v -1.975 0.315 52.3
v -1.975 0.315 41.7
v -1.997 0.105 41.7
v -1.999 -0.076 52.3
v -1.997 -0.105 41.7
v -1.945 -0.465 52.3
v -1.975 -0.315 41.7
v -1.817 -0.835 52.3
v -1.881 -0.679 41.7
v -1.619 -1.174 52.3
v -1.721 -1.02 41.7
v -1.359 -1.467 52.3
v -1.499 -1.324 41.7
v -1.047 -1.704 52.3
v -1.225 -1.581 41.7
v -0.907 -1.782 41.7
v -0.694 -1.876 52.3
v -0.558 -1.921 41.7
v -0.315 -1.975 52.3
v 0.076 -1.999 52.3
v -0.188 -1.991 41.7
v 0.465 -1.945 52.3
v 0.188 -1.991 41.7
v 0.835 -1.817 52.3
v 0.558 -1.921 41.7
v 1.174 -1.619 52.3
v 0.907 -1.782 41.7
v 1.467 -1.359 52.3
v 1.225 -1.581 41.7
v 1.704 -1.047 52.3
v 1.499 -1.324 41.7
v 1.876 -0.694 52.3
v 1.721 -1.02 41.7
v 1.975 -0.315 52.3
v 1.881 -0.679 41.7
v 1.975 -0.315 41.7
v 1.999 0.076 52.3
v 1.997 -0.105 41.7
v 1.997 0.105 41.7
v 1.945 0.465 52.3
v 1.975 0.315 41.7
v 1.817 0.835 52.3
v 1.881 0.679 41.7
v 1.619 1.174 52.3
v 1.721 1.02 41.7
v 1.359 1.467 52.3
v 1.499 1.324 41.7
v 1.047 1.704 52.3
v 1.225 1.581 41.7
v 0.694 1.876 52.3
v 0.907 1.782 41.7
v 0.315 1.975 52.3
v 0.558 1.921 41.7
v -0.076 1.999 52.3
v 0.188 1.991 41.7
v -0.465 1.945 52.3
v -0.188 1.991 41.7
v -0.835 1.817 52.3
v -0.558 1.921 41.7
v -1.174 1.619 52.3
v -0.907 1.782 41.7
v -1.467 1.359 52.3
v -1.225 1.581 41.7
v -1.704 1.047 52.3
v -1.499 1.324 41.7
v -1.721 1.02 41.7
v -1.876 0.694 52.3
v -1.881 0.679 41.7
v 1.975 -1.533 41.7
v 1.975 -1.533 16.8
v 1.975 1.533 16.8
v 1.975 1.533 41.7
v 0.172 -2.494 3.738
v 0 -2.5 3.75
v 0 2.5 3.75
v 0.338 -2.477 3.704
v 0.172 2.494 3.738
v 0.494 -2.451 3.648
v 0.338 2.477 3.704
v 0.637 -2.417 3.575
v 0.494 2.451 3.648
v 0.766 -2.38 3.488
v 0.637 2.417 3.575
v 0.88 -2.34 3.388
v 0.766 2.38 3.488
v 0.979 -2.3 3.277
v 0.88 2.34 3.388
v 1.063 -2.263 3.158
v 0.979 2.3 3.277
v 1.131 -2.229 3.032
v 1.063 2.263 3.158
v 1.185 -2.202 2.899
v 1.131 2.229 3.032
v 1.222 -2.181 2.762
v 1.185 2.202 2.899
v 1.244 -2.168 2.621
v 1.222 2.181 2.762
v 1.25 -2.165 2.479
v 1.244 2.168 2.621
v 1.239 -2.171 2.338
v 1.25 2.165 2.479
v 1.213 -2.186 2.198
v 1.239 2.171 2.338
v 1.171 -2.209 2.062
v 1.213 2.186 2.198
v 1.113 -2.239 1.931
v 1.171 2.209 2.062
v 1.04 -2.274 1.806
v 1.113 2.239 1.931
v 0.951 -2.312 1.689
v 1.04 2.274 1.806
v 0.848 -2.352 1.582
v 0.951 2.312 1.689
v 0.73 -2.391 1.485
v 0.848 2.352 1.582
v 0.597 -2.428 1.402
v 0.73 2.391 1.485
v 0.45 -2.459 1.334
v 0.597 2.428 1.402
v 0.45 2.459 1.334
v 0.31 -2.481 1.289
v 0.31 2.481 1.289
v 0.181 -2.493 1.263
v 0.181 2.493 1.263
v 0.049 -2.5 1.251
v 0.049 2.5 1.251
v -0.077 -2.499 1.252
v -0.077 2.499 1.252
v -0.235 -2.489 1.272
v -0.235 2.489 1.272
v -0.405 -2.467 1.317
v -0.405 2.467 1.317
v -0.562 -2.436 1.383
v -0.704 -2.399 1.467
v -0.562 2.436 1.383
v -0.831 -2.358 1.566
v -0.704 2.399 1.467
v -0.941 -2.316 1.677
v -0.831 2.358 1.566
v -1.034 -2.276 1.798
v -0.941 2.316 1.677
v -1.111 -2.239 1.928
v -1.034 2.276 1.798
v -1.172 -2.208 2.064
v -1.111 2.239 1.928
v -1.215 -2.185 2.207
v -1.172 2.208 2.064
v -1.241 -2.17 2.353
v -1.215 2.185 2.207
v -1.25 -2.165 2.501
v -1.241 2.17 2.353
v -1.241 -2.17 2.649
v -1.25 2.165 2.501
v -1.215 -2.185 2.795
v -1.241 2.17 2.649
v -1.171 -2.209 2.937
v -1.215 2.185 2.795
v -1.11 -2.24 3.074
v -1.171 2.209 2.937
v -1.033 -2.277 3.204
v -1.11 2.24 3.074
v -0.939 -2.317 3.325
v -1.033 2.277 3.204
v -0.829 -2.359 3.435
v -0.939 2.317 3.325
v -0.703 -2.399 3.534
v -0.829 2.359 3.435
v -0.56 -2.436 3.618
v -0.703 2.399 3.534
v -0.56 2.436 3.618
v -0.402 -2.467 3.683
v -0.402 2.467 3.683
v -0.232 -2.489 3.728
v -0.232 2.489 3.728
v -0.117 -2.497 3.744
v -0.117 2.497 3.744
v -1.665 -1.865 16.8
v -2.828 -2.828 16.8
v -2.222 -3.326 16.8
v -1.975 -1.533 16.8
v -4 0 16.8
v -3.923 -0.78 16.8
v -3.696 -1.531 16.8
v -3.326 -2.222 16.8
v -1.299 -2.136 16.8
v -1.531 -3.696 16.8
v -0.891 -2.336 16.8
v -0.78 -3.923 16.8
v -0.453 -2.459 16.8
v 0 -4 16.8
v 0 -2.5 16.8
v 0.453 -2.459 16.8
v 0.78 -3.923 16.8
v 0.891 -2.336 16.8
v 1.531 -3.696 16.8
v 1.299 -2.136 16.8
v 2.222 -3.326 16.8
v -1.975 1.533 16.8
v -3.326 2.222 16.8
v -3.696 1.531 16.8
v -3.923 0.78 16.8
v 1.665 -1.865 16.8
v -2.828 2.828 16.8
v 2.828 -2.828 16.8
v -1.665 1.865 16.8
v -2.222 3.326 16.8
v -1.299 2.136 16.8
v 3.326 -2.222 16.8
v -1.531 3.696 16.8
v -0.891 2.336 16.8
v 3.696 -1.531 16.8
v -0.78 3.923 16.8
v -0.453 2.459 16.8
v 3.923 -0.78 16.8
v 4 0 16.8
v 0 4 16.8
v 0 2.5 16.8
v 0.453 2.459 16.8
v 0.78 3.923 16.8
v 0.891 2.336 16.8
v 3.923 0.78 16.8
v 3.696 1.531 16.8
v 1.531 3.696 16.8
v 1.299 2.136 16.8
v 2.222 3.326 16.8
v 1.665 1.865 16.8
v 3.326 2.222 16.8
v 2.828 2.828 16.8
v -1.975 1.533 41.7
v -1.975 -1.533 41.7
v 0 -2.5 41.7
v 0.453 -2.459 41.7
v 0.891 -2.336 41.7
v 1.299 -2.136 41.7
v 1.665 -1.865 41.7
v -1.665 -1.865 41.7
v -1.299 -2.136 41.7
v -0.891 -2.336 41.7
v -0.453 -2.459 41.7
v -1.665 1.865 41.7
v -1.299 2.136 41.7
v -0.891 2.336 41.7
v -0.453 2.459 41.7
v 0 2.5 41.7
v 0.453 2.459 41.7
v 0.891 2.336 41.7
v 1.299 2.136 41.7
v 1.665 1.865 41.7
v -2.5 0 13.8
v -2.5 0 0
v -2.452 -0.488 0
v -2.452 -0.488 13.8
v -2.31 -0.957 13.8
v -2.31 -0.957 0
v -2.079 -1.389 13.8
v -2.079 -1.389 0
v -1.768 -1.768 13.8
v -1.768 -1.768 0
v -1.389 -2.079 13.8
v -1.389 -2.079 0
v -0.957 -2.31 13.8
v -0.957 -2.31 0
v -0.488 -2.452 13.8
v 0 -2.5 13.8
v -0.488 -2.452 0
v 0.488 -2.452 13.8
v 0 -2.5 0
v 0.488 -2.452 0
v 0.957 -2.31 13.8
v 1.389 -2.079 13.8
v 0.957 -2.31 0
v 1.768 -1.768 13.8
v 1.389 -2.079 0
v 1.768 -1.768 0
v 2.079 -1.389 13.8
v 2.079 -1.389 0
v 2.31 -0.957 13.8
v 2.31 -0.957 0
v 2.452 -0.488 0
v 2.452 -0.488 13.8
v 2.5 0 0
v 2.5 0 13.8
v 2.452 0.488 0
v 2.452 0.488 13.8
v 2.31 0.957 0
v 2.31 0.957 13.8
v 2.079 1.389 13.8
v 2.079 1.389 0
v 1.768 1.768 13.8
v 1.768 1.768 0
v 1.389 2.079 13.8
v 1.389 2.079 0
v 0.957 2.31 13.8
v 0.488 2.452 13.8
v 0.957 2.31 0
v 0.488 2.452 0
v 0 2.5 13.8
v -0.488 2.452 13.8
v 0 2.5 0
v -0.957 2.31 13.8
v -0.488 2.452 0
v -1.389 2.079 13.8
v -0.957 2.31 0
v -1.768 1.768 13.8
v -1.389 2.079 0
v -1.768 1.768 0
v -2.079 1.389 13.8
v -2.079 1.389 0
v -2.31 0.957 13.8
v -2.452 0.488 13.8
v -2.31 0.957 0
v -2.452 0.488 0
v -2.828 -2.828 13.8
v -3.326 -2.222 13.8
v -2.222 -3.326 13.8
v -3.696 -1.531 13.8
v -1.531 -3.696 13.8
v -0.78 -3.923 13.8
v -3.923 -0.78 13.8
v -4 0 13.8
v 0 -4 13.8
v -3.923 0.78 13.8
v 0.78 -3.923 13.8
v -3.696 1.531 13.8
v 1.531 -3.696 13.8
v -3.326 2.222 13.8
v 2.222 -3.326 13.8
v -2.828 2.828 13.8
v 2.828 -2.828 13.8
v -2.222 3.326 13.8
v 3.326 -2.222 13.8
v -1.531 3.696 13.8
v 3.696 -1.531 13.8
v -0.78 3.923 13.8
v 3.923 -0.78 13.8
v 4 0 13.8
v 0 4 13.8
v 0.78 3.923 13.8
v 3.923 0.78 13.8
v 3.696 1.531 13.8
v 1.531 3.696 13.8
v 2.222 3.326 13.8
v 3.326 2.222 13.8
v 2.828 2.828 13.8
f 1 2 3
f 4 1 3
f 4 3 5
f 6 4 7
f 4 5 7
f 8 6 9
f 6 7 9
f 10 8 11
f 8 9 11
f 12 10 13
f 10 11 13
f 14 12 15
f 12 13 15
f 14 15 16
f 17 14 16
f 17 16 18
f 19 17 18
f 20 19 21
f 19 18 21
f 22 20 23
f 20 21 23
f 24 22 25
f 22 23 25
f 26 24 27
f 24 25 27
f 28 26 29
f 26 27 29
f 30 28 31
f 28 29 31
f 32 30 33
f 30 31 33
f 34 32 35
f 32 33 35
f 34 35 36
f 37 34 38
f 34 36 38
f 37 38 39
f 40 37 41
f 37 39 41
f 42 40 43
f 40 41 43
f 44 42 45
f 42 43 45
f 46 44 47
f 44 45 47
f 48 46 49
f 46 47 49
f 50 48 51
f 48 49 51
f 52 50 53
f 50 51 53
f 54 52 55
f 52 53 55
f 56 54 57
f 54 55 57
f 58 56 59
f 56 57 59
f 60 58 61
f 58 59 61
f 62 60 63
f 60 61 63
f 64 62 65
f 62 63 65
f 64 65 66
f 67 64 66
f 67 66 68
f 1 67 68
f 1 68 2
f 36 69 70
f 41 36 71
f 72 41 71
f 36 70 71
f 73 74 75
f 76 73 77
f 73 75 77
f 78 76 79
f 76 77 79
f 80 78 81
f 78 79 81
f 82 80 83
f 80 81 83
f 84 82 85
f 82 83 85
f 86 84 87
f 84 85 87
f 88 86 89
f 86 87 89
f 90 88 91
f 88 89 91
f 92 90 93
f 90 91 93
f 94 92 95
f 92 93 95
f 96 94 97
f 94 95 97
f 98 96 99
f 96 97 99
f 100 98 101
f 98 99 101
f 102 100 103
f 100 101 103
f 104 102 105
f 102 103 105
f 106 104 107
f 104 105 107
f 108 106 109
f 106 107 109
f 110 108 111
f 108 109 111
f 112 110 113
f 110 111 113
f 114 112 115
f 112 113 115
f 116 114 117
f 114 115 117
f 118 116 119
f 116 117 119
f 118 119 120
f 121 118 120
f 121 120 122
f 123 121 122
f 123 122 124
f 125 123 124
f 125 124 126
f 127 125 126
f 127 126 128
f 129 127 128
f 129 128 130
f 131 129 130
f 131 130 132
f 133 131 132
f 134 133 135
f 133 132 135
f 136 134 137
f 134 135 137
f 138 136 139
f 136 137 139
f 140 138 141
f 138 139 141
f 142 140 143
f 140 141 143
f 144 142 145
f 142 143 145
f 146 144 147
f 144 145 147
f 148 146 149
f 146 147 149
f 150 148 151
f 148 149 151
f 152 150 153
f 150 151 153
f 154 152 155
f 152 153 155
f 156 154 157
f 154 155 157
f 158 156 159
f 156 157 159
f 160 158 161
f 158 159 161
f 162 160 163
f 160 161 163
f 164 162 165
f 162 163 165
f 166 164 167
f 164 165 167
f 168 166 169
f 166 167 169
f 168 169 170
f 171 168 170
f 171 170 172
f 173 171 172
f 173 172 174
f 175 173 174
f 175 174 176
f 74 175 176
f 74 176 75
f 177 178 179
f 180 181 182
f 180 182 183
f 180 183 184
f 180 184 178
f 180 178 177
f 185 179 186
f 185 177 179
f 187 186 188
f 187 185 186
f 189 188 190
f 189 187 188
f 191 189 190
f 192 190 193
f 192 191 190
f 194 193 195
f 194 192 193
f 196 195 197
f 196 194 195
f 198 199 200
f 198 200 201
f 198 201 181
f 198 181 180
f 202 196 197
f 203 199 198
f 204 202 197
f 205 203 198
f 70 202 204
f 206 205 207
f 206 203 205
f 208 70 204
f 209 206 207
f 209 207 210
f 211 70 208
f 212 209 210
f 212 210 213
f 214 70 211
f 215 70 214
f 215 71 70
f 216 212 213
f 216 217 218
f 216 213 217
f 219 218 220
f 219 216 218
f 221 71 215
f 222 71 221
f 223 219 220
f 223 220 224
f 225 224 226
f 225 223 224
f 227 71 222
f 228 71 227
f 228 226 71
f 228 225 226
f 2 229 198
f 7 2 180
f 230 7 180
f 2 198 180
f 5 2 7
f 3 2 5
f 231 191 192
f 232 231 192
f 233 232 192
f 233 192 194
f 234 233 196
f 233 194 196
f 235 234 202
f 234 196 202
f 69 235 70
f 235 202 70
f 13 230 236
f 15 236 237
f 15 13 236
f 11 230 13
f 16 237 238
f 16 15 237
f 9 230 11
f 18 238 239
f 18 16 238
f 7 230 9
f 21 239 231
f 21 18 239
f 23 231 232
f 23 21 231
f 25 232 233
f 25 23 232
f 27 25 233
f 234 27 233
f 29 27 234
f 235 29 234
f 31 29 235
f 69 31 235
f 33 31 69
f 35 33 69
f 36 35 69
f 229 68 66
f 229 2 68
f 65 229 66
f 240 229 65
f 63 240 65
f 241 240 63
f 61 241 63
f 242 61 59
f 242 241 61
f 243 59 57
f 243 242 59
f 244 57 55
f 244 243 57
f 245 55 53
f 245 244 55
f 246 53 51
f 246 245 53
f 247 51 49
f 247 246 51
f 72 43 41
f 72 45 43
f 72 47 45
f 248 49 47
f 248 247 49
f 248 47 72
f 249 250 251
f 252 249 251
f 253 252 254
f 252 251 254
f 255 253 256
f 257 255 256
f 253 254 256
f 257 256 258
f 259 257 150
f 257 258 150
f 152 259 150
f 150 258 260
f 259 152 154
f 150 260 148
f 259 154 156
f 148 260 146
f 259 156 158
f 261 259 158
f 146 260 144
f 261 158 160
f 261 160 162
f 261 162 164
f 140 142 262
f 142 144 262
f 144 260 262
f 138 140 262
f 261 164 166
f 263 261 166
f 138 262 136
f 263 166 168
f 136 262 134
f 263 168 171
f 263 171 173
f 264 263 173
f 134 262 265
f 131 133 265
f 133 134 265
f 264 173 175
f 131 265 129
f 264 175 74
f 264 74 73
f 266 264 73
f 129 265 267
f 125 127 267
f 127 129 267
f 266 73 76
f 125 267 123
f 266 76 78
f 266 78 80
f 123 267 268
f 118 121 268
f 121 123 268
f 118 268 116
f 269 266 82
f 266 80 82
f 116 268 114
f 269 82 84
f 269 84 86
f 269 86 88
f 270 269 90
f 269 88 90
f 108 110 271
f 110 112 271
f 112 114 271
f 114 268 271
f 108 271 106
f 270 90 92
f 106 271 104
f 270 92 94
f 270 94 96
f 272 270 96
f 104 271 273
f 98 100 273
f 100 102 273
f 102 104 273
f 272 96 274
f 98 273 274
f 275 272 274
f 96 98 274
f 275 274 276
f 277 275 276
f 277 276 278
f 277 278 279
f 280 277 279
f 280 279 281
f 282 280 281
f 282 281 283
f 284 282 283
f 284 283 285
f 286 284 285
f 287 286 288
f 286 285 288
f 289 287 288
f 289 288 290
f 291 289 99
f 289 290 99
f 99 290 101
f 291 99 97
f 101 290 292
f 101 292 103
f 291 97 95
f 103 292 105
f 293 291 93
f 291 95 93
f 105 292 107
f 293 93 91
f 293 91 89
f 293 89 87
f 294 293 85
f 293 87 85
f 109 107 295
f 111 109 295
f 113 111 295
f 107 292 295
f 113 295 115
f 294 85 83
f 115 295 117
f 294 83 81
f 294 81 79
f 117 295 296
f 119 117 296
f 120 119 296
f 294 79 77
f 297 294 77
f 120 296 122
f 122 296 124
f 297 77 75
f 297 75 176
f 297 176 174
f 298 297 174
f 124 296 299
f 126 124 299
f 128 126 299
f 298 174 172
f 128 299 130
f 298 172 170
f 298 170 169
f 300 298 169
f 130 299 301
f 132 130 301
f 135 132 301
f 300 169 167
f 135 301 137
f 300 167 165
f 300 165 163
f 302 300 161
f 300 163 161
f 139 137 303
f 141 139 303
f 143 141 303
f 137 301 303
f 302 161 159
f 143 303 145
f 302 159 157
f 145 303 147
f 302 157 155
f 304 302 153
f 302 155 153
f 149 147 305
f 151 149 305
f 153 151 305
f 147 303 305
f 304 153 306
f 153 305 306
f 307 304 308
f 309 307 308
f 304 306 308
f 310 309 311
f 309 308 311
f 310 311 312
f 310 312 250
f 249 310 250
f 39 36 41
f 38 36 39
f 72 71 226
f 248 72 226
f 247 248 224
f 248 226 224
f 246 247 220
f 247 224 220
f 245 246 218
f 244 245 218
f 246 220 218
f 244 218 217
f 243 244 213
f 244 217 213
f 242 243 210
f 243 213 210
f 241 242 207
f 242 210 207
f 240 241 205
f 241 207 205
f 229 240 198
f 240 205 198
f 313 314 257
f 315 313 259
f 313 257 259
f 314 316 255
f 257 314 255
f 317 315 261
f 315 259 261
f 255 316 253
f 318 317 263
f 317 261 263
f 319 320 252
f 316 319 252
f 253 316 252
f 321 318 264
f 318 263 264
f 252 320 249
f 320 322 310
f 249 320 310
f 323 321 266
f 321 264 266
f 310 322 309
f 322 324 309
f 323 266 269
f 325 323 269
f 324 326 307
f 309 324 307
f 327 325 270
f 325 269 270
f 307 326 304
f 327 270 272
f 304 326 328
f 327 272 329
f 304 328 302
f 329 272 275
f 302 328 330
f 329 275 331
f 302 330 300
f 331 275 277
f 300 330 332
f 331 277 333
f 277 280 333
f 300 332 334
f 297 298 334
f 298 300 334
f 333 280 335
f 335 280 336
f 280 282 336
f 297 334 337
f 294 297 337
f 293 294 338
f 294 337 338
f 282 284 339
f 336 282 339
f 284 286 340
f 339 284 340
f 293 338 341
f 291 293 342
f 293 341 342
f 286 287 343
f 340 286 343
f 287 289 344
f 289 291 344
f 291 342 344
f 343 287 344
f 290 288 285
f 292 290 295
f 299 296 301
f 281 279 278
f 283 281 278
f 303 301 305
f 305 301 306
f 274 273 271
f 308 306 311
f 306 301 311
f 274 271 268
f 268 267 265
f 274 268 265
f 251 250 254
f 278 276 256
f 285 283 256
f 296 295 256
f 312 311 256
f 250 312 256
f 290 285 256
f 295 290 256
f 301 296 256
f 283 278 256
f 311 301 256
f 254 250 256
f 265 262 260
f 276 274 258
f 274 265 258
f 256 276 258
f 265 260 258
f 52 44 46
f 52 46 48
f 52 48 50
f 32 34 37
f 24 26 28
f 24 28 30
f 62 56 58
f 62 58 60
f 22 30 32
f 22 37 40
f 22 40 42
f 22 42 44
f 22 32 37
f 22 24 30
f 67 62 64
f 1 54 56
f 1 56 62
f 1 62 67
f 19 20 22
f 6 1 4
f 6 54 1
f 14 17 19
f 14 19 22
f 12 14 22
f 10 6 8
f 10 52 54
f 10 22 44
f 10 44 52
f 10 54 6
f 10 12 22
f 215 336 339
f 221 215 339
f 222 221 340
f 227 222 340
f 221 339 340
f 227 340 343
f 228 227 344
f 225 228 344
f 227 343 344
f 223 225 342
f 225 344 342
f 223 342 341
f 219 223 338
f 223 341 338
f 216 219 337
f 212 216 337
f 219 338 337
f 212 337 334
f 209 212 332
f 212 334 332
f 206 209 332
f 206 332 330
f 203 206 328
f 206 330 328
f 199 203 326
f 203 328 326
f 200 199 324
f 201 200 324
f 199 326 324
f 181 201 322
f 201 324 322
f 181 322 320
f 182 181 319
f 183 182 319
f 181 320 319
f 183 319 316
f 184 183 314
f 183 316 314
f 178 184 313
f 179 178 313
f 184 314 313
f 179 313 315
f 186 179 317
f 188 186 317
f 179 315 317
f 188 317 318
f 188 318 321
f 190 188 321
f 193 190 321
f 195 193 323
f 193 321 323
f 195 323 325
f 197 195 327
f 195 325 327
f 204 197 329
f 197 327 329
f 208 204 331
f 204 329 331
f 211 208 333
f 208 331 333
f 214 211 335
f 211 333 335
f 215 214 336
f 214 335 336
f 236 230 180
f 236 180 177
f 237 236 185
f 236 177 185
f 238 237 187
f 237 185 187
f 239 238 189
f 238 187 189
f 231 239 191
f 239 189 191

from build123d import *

# Parameters (mm, degrees)
SKETCH1_R               = 2.5
BOSS_EXTRUDE1_DEPTH     = 13.8
BOSS_EXTRUDE3_START     = 13.8
SKETCH1_4_R             = 4
BOSS_EXTRUDE3_DEPTH     = 3
BOSS_EXTRUDE2_START     = 16.8
BOSS_EXTRUDE2_DEPTH     = 24.9
SKETCH2_R               = 2
BOSS_EXTRUDE4_DEPTH     = 10.6
SKETCH17_R              = 1.25
CUT_EXTRUDE1_DEPTH      = 53.605037782
CUT_EXTRUDE1_DEPTH_BACK = 53.605037782


with BuildPart() as part:
    # Sketch1 → Boss-Extrude1 (new body)
    with BuildSketch(Plane.XY):
        with Locations(Location((0, 0, 0), (0, 0, 180))):
            Circle(SKETCH1_R)
    extrude(amount=BOSS_EXTRUDE1_DEPTH)

    # Sketch1<4> → Boss-Extrude3 (add)
    with BuildSketch(Plane.XY.offset(BOSS_EXTRUDE3_START)):
        Circle(SKETCH1_4_R)
    extrude(amount=BOSS_EXTRUDE3_DEPTH)

    # Sketch1<3> → Boss-Extrude2 (add)
    with BuildSketch(Plane.XY.offset(BOSS_EXTRUDE2_START)):
        with BuildLine():
            ThreePointArc((0, -2.5), (1.099564058, -2.245207982), (1.975, -1.532767106))
            Line((1.975, -1.532767106), (1.975, 1.532767106))
            ThreePointArc((1.975, 1.532767106), (0, 2.5), (-1.975, 1.532767106))
            Line((-1.975, 1.532767106), (-1.975, -1.532767106))
            ThreePointArc((-1.975, -1.532767106), (-1.099564058, -2.245207982), (0, -2.5))
        make_face()
    extrude(amount=BOSS_EXTRUDE2_DEPTH)

    # Sketch2 → Boss-Extrude4 (add)
    with BuildSketch(Plane.XY.offset(41.7)):
        with Locations(Location((0, 0, 0), (0, 0, 170.931278454))):
            Circle(SKETCH2_R)
    extrude(amount=BOSS_EXTRUDE4_DEPTH)

    # Sketch17 → Cut-Extrude1 (cut, two sides)
    with BuildSketch(Plane(origin=(0, 0, 0), x_dir=(1, 0, 0), z_dir=(0, 1, 0))) as cut_extrude1_sk:
        with Locations(Location((0, -2.5, 0), (0, 0, 270))):
            Circle(SKETCH17_R)
    extrude(amount=CUT_EXTRUDE1_DEPTH, mode=Mode.SUBTRACT)
    extrude(cut_extrude1_sk.sketch, amount=-CUT_EXTRUDE1_DEPTH_BACK, mode=Mode.SUBTRACT)


solid = part.part
